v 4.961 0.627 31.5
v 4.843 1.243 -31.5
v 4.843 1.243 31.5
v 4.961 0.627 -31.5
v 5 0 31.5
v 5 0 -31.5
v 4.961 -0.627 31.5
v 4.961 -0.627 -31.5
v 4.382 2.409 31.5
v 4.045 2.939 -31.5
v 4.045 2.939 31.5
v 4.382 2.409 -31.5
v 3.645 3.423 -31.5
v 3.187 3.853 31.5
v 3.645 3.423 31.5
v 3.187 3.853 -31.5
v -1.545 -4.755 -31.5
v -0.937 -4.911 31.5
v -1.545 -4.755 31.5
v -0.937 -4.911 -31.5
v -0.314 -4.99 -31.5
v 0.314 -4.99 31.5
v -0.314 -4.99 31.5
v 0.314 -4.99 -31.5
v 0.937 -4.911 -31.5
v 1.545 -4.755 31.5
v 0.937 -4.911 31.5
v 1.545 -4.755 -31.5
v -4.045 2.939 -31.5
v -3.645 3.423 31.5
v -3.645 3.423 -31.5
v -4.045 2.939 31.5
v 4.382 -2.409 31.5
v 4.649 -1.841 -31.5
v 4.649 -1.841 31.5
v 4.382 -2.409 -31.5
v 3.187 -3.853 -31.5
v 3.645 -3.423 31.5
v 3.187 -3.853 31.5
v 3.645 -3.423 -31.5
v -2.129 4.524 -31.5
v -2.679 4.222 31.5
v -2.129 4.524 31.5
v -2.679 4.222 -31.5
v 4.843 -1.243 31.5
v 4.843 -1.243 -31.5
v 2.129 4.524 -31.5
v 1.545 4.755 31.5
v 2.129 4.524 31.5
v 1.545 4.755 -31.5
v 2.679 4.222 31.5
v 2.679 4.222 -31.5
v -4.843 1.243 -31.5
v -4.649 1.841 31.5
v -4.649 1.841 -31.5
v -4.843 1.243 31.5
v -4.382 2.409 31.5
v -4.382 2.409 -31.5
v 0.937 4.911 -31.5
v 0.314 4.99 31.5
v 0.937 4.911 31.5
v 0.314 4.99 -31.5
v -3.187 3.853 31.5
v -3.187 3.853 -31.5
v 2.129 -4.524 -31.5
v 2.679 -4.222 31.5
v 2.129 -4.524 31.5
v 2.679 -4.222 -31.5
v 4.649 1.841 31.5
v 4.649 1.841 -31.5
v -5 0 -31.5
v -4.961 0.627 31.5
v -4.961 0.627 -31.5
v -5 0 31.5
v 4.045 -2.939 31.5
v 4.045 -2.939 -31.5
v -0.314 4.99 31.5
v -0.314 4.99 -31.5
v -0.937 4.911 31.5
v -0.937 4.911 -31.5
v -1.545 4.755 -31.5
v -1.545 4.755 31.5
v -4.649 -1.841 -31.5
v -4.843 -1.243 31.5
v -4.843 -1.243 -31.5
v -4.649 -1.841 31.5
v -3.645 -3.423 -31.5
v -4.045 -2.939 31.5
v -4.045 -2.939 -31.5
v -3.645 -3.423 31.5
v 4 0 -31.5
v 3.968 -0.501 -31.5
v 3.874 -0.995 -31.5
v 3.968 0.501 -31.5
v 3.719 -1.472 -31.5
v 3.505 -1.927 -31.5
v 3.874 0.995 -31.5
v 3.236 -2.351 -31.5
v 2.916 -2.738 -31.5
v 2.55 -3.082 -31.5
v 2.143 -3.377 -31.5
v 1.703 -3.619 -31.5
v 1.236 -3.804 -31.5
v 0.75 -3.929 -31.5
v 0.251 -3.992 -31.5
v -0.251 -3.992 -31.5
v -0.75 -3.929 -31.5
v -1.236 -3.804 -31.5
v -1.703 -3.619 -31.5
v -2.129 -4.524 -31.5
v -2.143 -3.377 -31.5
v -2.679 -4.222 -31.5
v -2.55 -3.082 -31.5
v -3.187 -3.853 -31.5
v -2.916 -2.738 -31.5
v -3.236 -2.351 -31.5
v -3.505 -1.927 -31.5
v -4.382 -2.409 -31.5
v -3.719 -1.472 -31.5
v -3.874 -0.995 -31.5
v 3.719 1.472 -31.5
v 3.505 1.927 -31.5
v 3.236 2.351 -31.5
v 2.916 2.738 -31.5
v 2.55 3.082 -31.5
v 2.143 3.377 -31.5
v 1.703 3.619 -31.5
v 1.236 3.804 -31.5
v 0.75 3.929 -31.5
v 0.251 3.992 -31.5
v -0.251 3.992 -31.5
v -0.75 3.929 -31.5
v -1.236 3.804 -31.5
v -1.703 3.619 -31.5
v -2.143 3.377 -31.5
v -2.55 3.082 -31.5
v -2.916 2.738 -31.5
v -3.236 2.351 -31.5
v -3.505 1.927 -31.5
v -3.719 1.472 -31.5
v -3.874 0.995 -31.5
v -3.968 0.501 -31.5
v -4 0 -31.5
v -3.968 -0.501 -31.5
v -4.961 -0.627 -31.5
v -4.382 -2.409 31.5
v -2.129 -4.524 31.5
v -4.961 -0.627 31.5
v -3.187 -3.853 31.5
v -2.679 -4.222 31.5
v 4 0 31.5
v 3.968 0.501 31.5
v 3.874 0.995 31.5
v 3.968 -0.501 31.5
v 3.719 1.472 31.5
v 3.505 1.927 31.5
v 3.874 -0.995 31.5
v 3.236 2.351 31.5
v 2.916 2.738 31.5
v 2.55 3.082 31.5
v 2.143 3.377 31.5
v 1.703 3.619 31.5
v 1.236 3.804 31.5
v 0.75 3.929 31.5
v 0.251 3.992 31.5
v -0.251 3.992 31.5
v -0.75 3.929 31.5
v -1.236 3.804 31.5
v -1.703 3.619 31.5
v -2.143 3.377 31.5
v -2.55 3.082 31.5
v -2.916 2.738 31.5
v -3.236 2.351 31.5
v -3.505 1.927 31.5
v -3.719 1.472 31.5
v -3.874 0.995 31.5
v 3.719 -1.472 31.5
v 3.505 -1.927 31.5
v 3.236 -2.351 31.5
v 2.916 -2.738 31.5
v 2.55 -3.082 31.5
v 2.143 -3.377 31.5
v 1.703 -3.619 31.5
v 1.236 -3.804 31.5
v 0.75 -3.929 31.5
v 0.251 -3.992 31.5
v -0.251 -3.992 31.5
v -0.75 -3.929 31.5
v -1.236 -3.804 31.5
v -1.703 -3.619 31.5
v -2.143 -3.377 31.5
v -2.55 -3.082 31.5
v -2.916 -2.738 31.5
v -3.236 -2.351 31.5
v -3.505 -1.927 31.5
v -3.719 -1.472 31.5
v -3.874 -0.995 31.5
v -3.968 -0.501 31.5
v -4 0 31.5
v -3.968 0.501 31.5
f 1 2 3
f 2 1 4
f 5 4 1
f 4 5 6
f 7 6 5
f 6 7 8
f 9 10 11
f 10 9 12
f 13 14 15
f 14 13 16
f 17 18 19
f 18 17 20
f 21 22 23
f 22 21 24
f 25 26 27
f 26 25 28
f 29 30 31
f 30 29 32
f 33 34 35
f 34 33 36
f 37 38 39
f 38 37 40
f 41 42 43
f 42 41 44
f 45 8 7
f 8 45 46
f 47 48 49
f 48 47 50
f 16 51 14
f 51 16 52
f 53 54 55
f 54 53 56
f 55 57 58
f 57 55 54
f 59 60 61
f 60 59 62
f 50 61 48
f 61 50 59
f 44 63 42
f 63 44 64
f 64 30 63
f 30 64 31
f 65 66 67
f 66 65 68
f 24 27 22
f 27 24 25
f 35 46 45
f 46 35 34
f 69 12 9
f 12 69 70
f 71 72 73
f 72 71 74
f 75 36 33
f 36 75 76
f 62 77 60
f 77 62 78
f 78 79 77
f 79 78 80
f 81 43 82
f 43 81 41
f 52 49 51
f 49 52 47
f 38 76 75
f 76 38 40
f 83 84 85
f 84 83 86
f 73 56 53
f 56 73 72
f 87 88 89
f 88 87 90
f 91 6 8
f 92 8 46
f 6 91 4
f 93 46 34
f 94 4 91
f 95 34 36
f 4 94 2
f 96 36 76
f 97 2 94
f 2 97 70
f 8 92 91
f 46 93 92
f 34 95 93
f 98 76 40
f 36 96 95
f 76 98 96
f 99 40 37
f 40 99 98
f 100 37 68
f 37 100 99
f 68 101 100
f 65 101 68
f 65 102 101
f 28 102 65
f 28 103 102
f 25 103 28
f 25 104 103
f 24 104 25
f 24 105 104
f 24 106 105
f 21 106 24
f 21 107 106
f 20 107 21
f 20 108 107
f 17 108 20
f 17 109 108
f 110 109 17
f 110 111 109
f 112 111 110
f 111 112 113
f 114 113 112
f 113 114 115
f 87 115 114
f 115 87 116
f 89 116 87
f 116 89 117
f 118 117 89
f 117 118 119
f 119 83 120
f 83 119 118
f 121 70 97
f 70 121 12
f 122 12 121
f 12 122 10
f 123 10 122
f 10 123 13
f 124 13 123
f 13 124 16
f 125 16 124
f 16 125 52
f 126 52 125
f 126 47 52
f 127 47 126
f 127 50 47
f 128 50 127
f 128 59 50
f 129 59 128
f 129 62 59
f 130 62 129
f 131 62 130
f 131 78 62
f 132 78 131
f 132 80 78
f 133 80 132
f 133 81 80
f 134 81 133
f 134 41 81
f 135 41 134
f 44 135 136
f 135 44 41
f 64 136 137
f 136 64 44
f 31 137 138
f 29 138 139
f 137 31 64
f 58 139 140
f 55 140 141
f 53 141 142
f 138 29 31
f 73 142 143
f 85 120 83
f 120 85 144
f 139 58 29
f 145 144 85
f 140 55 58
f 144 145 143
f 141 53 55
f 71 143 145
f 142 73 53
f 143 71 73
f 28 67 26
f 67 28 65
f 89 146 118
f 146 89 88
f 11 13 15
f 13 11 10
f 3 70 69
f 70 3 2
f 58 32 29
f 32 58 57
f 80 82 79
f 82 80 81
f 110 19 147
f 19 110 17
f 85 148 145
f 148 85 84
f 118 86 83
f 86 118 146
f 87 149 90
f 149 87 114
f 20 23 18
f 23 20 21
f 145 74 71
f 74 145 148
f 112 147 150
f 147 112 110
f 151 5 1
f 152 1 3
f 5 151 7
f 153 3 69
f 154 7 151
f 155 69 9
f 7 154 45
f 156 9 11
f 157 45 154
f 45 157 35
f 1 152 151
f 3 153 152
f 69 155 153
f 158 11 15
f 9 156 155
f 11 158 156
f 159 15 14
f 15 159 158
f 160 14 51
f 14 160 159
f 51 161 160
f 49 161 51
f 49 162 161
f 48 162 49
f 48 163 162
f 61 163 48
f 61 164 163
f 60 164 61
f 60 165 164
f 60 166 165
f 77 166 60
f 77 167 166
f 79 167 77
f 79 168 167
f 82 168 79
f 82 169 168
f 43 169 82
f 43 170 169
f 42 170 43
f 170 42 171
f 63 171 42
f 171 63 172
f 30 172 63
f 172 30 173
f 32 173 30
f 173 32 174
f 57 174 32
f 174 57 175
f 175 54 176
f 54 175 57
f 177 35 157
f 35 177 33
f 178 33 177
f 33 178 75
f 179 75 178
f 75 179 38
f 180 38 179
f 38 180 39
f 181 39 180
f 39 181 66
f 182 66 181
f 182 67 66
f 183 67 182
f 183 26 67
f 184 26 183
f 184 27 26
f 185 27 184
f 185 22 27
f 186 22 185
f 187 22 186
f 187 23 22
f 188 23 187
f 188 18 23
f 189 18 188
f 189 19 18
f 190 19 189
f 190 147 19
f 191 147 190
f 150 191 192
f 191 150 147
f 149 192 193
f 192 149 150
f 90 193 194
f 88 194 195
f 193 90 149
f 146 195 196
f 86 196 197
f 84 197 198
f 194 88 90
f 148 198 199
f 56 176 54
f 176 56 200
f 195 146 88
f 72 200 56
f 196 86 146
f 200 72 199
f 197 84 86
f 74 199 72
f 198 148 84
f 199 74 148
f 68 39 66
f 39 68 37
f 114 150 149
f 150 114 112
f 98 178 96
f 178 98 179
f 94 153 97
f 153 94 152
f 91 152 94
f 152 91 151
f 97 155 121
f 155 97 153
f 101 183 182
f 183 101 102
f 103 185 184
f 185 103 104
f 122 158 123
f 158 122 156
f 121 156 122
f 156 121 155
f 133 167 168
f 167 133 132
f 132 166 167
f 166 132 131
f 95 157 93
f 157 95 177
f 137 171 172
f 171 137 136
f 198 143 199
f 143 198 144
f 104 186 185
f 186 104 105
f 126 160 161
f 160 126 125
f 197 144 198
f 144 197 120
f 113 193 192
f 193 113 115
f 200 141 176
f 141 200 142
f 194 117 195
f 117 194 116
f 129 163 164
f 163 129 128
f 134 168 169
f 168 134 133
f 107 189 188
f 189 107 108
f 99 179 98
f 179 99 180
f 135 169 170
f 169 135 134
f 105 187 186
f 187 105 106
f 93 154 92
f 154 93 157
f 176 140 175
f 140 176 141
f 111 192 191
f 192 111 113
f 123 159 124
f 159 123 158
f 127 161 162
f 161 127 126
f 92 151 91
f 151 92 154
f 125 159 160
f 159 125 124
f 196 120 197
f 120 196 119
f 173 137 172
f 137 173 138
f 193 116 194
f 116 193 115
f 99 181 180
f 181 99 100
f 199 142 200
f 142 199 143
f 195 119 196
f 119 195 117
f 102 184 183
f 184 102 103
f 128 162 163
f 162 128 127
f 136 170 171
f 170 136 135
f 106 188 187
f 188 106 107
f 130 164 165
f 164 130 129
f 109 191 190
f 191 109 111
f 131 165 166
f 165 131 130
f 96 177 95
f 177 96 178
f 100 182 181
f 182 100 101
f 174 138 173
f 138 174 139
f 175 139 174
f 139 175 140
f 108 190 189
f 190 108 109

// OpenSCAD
$fn = 50;


difference() {
	union() {
		translate(v = [0, 0, -31.5000000000]) {
			cylinder(h = 63, r = 5.0000000000);
		}
	}
	union() {
		translate(v = [0, 0, -100.0000000000]) {
			cylinder(h = 200, r = 4.0000000000);
		}
	}
}
